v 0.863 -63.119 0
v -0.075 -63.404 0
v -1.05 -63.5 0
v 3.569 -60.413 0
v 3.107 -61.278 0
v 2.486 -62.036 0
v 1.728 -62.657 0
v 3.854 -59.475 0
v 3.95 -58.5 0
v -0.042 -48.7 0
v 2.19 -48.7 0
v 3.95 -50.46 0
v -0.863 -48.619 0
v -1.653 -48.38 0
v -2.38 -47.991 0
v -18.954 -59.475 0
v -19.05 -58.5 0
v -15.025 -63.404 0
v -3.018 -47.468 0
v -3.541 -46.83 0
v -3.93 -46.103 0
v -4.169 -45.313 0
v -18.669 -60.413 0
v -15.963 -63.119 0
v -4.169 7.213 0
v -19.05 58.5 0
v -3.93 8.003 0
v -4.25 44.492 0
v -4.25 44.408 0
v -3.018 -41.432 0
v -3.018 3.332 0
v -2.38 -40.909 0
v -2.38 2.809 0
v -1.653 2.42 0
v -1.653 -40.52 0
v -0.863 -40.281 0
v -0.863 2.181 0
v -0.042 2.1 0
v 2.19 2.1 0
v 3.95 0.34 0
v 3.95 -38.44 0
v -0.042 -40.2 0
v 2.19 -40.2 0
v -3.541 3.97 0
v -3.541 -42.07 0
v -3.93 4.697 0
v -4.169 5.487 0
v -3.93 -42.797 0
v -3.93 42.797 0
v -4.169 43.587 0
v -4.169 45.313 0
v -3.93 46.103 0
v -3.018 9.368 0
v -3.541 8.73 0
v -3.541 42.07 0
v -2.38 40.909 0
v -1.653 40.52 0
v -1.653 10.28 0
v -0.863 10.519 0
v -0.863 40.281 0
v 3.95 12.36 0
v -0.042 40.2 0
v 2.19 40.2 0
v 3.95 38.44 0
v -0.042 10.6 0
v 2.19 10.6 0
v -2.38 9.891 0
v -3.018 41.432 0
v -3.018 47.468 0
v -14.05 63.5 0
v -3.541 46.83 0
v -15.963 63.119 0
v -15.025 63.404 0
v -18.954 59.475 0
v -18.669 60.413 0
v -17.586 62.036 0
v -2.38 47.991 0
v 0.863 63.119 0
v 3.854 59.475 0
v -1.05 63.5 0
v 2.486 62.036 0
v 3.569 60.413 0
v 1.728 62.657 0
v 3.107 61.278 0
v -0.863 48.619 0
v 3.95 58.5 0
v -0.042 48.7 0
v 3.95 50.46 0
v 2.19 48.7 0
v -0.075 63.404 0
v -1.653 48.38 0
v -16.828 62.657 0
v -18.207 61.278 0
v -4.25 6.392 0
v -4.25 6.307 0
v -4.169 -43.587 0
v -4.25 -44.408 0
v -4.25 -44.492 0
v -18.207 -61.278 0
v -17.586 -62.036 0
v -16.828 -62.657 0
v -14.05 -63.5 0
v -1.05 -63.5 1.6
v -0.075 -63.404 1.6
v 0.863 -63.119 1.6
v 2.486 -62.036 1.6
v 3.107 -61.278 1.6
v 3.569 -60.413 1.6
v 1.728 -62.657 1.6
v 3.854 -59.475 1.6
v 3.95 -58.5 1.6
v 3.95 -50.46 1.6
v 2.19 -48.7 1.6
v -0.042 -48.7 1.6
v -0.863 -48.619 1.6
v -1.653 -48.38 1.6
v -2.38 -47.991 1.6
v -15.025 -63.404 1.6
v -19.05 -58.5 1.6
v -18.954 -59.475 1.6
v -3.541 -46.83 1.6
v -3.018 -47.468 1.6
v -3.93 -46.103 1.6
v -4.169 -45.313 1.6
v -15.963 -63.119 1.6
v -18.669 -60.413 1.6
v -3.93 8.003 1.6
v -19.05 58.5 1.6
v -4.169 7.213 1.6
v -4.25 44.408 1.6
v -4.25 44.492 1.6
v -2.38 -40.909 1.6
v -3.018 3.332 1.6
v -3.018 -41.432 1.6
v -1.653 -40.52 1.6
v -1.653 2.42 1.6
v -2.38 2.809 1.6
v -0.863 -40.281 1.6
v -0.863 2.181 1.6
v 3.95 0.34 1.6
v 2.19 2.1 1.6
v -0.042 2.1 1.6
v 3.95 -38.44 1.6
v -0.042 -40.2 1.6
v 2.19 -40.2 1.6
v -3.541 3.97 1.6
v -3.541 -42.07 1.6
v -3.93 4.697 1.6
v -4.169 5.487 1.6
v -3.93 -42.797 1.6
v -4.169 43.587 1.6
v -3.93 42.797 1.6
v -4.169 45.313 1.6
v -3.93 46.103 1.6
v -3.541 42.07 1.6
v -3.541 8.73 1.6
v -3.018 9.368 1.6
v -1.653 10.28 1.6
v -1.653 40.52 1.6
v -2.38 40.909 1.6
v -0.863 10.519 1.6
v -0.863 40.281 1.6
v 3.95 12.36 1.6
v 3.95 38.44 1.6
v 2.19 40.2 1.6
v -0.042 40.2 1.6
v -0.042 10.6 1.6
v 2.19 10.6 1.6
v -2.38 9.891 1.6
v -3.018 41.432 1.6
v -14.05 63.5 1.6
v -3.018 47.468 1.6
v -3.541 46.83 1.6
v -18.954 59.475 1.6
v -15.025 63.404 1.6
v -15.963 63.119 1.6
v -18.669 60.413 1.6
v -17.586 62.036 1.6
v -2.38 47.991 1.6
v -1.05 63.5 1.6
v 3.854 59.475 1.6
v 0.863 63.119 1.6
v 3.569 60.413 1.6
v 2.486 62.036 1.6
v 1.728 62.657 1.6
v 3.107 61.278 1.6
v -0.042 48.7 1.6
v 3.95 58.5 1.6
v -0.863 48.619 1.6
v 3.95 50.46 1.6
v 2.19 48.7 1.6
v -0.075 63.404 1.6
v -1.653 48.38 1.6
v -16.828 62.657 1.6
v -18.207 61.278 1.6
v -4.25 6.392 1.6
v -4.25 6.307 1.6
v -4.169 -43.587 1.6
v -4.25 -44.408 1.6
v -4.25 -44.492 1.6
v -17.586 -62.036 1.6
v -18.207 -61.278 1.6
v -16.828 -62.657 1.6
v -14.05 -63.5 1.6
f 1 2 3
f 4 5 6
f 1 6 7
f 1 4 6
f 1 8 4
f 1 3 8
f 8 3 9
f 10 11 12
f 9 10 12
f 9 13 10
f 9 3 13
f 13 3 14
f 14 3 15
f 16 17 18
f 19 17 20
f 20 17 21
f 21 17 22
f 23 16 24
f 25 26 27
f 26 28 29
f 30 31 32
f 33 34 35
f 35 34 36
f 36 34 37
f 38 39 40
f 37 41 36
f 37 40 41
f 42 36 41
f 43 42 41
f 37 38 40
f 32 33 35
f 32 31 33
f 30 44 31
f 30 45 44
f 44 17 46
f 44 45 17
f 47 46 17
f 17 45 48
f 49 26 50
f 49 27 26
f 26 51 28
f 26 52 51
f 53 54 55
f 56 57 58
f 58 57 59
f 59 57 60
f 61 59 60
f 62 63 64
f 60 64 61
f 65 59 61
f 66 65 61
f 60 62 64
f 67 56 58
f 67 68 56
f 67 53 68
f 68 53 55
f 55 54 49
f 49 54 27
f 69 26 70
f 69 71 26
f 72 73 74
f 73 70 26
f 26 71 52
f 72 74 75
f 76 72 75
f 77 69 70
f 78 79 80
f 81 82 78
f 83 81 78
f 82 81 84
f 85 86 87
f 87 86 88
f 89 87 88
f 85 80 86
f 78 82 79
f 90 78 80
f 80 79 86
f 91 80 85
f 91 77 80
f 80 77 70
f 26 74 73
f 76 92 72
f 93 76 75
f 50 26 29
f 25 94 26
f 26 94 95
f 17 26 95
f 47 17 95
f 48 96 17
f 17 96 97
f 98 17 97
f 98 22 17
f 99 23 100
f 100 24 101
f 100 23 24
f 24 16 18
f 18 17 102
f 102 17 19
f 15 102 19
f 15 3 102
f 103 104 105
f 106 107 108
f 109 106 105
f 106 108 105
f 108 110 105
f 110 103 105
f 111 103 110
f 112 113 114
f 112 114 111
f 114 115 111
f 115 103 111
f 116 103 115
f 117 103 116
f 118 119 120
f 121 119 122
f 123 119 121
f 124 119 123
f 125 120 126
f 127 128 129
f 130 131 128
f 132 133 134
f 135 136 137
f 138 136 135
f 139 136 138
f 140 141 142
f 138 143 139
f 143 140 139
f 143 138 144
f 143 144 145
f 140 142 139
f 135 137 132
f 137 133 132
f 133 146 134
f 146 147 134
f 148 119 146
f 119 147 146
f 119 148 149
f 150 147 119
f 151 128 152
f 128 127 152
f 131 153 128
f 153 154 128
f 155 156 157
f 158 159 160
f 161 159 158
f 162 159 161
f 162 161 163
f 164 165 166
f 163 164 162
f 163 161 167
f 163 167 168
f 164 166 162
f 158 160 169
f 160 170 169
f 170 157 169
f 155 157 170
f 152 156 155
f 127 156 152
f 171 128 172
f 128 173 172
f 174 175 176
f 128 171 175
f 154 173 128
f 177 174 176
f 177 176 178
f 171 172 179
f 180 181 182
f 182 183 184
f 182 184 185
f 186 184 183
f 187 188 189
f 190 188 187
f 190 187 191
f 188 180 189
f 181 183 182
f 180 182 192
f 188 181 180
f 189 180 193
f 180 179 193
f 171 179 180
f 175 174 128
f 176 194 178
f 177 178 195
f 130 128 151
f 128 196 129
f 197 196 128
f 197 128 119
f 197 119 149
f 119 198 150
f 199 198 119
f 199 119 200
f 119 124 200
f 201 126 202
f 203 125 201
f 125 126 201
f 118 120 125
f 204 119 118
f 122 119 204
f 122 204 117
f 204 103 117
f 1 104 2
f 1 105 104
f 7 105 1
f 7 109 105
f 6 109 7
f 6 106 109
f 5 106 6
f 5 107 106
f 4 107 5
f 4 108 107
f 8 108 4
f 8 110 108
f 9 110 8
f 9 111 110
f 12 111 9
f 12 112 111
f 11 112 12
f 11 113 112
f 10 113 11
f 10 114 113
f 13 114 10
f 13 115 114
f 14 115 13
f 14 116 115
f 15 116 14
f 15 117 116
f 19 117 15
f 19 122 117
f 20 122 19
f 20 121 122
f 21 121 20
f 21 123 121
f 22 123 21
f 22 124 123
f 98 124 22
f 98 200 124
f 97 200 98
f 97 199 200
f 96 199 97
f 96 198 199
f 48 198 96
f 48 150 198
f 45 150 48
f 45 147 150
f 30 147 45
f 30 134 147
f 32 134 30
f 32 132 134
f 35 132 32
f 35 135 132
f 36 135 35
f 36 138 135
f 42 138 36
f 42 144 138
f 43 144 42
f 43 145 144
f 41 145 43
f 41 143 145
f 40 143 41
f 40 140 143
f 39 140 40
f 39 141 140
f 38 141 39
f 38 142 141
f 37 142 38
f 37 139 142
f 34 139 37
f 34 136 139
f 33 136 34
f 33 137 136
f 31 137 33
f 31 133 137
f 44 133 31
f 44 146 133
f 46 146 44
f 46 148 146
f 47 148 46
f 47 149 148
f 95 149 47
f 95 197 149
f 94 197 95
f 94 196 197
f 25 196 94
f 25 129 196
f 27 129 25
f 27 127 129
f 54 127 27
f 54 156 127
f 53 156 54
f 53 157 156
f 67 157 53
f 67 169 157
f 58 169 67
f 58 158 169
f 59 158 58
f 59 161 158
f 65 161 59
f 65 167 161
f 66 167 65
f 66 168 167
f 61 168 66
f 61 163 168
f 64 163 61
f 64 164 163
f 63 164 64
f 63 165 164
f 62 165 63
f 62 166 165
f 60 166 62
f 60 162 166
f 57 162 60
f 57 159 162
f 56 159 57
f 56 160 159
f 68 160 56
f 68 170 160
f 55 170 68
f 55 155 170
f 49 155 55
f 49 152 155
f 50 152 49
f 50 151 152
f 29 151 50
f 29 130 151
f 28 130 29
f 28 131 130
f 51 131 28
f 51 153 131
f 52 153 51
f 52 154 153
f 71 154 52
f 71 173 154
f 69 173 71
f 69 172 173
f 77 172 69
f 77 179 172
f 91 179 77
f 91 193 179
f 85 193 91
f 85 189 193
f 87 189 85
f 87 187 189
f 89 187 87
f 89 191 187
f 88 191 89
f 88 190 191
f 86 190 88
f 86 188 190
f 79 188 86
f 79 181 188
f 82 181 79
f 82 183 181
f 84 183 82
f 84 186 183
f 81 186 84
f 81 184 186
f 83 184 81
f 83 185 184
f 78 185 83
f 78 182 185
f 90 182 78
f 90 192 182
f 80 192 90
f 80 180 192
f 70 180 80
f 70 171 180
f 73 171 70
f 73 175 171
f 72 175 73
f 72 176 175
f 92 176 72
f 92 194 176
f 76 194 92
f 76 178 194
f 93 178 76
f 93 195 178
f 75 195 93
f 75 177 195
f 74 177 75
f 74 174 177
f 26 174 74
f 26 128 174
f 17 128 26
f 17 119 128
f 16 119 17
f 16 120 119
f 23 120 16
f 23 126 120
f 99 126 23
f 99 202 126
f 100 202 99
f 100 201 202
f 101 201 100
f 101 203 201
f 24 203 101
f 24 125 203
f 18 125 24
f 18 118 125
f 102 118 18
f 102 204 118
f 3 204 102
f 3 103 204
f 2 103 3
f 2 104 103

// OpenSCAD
// file: ../lib/TOGArrayLib1.scad
// TOGArrayLib1.4
// 
// Functions for working with arrays.
// 
// v1.1:
// - tal1_reduce assert(is_list(items)) to prevent infinite recursion
//   when given undefined or other non-list values
// v1.1.1:
// - Fix tal1_uniq_remap_v2 to return "list-remap-result" as the
//   first element of the returned list
// v1.2:
// - Add tal1_replace_at function
// v1.3:
// - tal1_is_vec_of, tal1_is_vec_of_num
// v1.4:
// - tal1_assert_for_each, for when you want to assert something
//   about each of a list of items and get nice failure messages

/**
 * Make a list with the contents of list `a`,
 * but starting at offset `off`, replaced by the contents of list `b`.
 * len(result) = max(len(a), off+len(b))
 */
function tal1_replace_at(a, off, b, default_value=undef, default_value_function=undef) =
	assert(is_list(a))
	assert(is_list(b))
	let( _dvf = !is_undef(default_value_function) ? default_value_function : function(i) default_value )
[
	for( i=[0:1:min(off,len(a))-1] ) a[i],
	for( i=[len(a):1:off-1] ) _dvf(i),
	for( i=[off:1:off+len(b)-1] ) b[i-off],
	for( i=[off+len(b):1:len(a)-1] ) a[i],
];

// Simplest case
assert([] == tal1_replace_at([], 0, []));
// Second simplest cases
assert(["foo"] == tal1_replace_at(["foo"], 0, []));
assert(["foo"] == tal1_replace_at([], 0, ["foo"]));
// Replace one item
assert(["foo","quux","baz"] == tal1_replace_at(["foo","bar","baz"], 1, ["quux"]));
// Replace and extend
assert(["foo","quux","tuna","tina"] == tal1_replace_at(["foo","bar","baz"], 1, ["quux", "tuna", "tina"]));
// Add beyond end of `a`
assert(["foo","zzz","quux"] == tal1_replace_at(["foo"], 2, ["quux"], default_value="zzz"));
// Adding 'nothing' should still fill to that point with defaults
assert(["foo","zzz","zzz"] == tal1_replace_at(["foo"], 3, [], default_value="zzz"));


function tal1_reduce(start, items, func, offset=0) =
	assert(is_list(items))
	len(items) == offset ? start :
	tal1_reduce(func(start, items[offset]), items, func, offset+1);

function tal1_consecutive_duplicate_count(items) = tal1_reduce(
	[0, undef],
	items,
	function(z,item) [z[0] + (item == z[1] ? 1 : 0), item]
)[0];

assert(0 == tal1_consecutive_duplicate_count([]));
assert(0 == tal1_consecutive_duplicate_count([50]));
assert(1 == tal1_consecutive_duplicate_count([50,50]));
assert(0 == tal1_consecutive_duplicate_count([50,51,52,53]));
assert(1 == tal1_consecutive_duplicate_count([50,51,52,52]));
assert(3 == tal1_consecutive_duplicate_count([50,50,50,50]));

// Set test_size to arbirarily large values
// to ensure that OpenSCAD can handle heavy recursion
let(test_size=1000) assert(test_size/2 == tal1_consecutive_duplicate_count([for(i=[0:1:test_size-1]) floor(i/2)]));



function tal1_uniq_(items, off0, off1) =
	let(chunklen = off1-off0)
	chunklen == 0 ? [] :
	chunklen == 1 ? [items[off0]] :
	let(half=floor(chunklen/2))
	let(left  = tal1_uniq_(items, off0     , off0+half))
	let(right = tal1_uniq_(items, off0+half, off1     ))
	assert(len(left) > 0)
	assert(len(right) > 0)
	left[len(left)-1] == right[0] ? [each left, for(i=[1:1:len(right)-1]) right[i]] :
	[each left, each right];

/** Given a list of items, returns a new list with identical consecutive items merged */
function tal1_uniq(items) = tal1_uniq_(items, 0, len(items));

assert([] == tal1_uniq([]));
assert([123] == tal1_uniq([123]));
assert([55,0,1,2,3] == tal1_uniq([55,0,1,2,3]));
assert([55,0,1,2] == tal1_uniq([55,0,1,1,2]));
assert([55,0,1] == tal1_uniq([55,55,0,0,0,0,0,0,1,1,1,1]));
assert([55,0] == tal1_uniq([55,0,0,0,0,0,0,0]));



/**
 * Returns [new items, old index -> new index mapping].
 * No-op version.
 */
function tal1_uniq_remap_v1(items) =
	["list-remap-result", items, [for (vi=[0:1:len(items)-1]) vi]];

// [a, a, b, b, c, c]
//
// [a,    ...], []  -> [a],[0]
// [a, a, ...], [0] -> [a],[0,0]

assert([1,2,3] == [1,2,3]);

/**
 * Recursive version that will combine adjacent identical vertexes,
 * but will use the original items.
 */
function tal1_uniq_remap_v2(items, map=[]) =
	let(index = len(map))
	len(items) == index ? ["list-remap-result", items, map] :
	index == 0 ? tal1_uniq_remap_v2(items, [0]) :
	items[index] == items[map[index-1]] ? tal1_uniq_remap_v2(items, [for(vi=map) vi, map[index-1]]) :
	tal1_uniq_remap_v2(items, [for(vi=map) vi, index]);

assert(tal1_uniq_remap_v2([1,1,2,2,3,4]) == ["list-remap-result", [1,1,2,2,3,4], [0,0,2,2,4,5]]);


/**
 * Returns true if `vec` is a list of at least min_len items
 * and component_check(each item, even those beyond min_len) is true.
 */
function tal1_is_vec_of(vec, min_len=0, component_check=function(x) true) =
	assert(is_num(min_len) && min_len >= 0)
	assert(is_function(component_check))
	is_list(vec) && len(vec) >= min_len &&
	tal1_reduce(true, vec, function(prev,item) prev && component_check(item));

function tal1_is_vec_of_num(vec, min_len=0) = tal1_is_vec_of(vec, min_len, function(i) is_num(i));

assert( true == tal1_is_vec_of_num([1,2,3]));
assert( true == tal1_is_vec_of_num([]));
assert( true == tal1_is_vec_of_num([1,2,3], 3));
assert(false == tal1_is_vec_of_num([1,2], 3));
assert(false == tal1_is_vec_of_num([1,2,"spoon"], 3));
// Requirements are ambiguous when
// first min_len items are numbers, but there are non-numeric items afterwards,
// so let's error on the side of saying 'no, it's not a list of numbers';
// i.e. the item check and the min_len are independent.
assert(false == tal1_is_vec_of_num([1,2,3,"artichoke"], 3));


/**
 * Asserts that item_checker(each item in list, index of item)[0] is true.
 * Second element of item_checker return value is assertion message.
 * Returns the original list, in case that's useful to you.
 */
function tal1_assert_for_each(list, item_checker) =
	let( _ignored = [ for(i=[0:1:len(list)-1])
		let(q=item_checker(list[i],i))
		let(passed=is_bool(q) ? q : is_list(q) ? q[0] : assert(false, str(
			"tal1_assert_for_each: item_checker should return Bool|[Bool,String], but returned ",
			q, " for item at index ", i)))
		let(message=is_list(q) ? q[1] : undef)
		assert(passed, message)
		q
	])
	list;

// Callback can return a boolean...
assert([1,2,3] == tal1_assert_for_each([1,2,3], function(v,i) is_num(v)));
// ...or a [boolean, string]
assert([1,2,3] == tal1_assert_for_each([1,2,3], function(v,i) [is_num(v), "element be a num"]));
// file: ../lib/TOGMod1Constructors.scad
// TOGMod1Constructors-v1.7
// 
// Functions to construct objects understood by TOGMod1
// 
// v1.1:
// - Add togmod1_make_rounded_rect
// v1.2:
// - togmod1_make_rounded_rect can make ovals
// v1.3:
// - togmod1_circle_points, to just get the points of a circle
// - if pos parameter to circle function has a third element,
//   returned vertexes will include it as the z component;
// v1.3.1
// - Some assertions
// v1.4:
// - Refactor togmod1_rounded_rect_points and togmod1_circle_points
//   to use togmod1__make_nd_vector_adder for adapting to whatever
//   `pos` parameter is.
// v1.5:
// - togmod_rounded_rect_points will not simplify completely rounded sides
//   (where length of side is exactly twice the rounding radius)
//   unless simplify_rounded_sides=true
//   - This makes it more useful for polyhedron generation,
//     where radius varies, but number of points must remain constant.
// v1.6:
// - togmod1_make_rect makes a simple rectangle
// - togmod1_make_rounded_rect will defer to togmod1_make_rect when r=0
// v1.7:
// - togmod1_make_circle will return empty shape (["union"]) when d=0

use <./TOGArrayLib1.scad>

function togmod1__make_nd_vector_adder(origin=[0,0]) =
	let(origin_is_zero = tal1_reduce(true, origin, function(prev,item) prev && item == 0))
	origin_is_zero ? (function(vec) len(vec) >= len(origin) ? vec : tal1_replace_at(origin, 0, vec)) :
	function(vec) [
		for(i=[0:1:max(len(origin),len(vec))-1]) (len(vec) > i ? vec[i] : 0) + (len(origin) > i ? origin[i] : 0),
	];

assert([1,2,3] == togmod1__make_nd_vector_adder()([1,2,3]));
echo(togmod1__make_nd_vector_adder([0,0,3])([1,2]));
assert([1,2,3] == togmod1__make_nd_vector_adder([0,0,3])([1,2]));


function togmod1_make_cuboid(size) =
	assert(is_list(size))
	assert(len(size) >= 3)
	assert(is_num(size[0]))
	assert(is_num(size[1]))
	assert(is_num(size[2]))
	["polyhedron-vf", [
		[-size[0]/2, -size[1]/2, -size[2]/2],
		[+size[0]/2, -size[1]/2, -size[2]/2],
		[-size[0]/2, +size[1]/2, -size[2]/2],
		[+size[0]/2, +size[1]/2, -size[2]/2],
		[-size[0]/2, -size[1]/2, +size[2]/2],
		[+size[0]/2, -size[1]/2, +size[2]/2],
		[-size[0]/2, +size[1]/2, +size[2]/2],
		[+size[0]/2, +size[1]/2, +size[2]/2]
	], [
		[0,1,3,2],[0,4,5,1],[4,6,7,5],[3,7,6,2],[1,5,7,3],[6,4,0,2]
	]];

function togmod1_make_polygon(verts) =
	["polygon-vp", verts, [[for( i=[0:1:len(verts)-1] ) i%len(verts)]]];

function togmod1_rounded_rect_points(size, r, pos=[0,0], simplify_rounded_sides=false) =
	assert(is_list(size))
	assert(len(size) >= 2)
	let(radii = is_list(r) ? r : is_num(r) ? [r,r] : assert(false, "rounded_rect r(adius) should be list<num> or num"))
	let(rx = radii[0])
	let(ry = radii[1])
	assert(is_num(rx))
	assert(is_num(ry))
	assert(size[0] >= 2*rx, str("size[0] must be >= 2*r[0]; size[0] = ",size[0],", 2*r[0] = ",2*rx))
	assert(size[1] >= 2*ry, str("size[1] must be >= 2*r[1]; size[1] = ",size[1],", 2*r[1] = ",2*ry))
	let(quarterfn=max($fn/4, 1))
	let(qfnx = simplify_rounded_sides && size[0] == 2*rx ? quarterfn-1 : quarterfn)
	let(qfny = simplify_rounded_sides && size[1] == 2*ry ? quarterfn-1 : quarterfn)
	let(finalizepos = togmod1__make_nd_vector_adder(pos))
[
	for(a=[0 : 1 : qfnx]) let(ang=      a*90/quarterfn) finalizepos([ size[0]/2-rx + rx*cos(ang),  size[1]/2-ry + ry*sin(ang)]),
	for(a=[0 : 1 : qfny]) let(ang= 90 + a*90/quarterfn) finalizepos([-size[0]/2+rx + rx*cos(ang),  size[1]/2-ry + ry*sin(ang)]),
	for(a=[0 : 1 : qfnx]) let(ang=180 + a*90/quarterfn) finalizepos([-size[0]/2+rx + rx*cos(ang), -size[1]/2+ry + ry*sin(ang)]),
	for(a=[0 : 1 : qfny]) let(ang=270 + a*90/quarterfn) finalizepos([ size[0]/2-rx + rx*cos(ang), -size[1]/2+ry + ry*sin(ang)]),
];

function togmod1_make_rect(size) =
	togmod1_make_polygon([
		[-size[0]/2, -size[1]/2],
		[+size[0]/2, -size[1]/2],
		[+size[0]/2, +size[1]/2],
		[-size[0]/2, +size[1]/2],
	]);

function togmod1_make_rounded_rect(size, r) =
	r == 0 ? togmod1_make_rect(size) :
	togmod1_make_polygon(togmod1_rounded_rect_points(size,r,simplify_rounded_sides=true));

function togmod1_circle_points(r, pos=[0,0], d=undef) =
	assert( !is_undef(r) || !is_undef(d) )
	assert(!is_undef(pos[0]))
	assert(!is_undef(pos[1]))
	let(finalizepos = togmod1__make_nd_vector_adder(pos))
	let(r_ = !is_undef(r) ? r : d/2)
	let(fn = max($fn, 6))
	[for(i=[0 : 1 : fn-1]) finalizepos([r_*cos(i*360/fn), r_*sin(i*360/fn)])];

function togmod1_make_circle(r, pos=[0,0], d=undef) =
	r == 0 || d == 0 ? ["union"] :
	togmod1_make_polygon(togmod1_circle_points(r=r, pos=pos, d=d));

function togmod1_make_cylinder(d, zrange=[0,1], r=undef, pos=[0,0]) =
	assert( !is_undef(r) || !is_undef(d) )
	let( r_ = !is_undef(r) ? r : d/2 )
	// TODO: Make polyhedron directly
	["linear-extrude-zs", zrange, togmod1_make_circle(r=r_, pos=pos)];

function togmod1__is_range1d(range) = is_list(range) && len(range) == 2 && is_num(range[0]) && is_num(range[1]);

function togmod1_linear_extrude_z(range, shape) =
	assert(togmod1__is_range1d(range))
	["linear-extrude-zs", range, shape];
function togmod1_linear_extrude_x(range, shape) =
	assert(togmod1__is_range1d(range))
	["rotate", [90, 0, 90], togmod1_linear_extrude_z(range, shape)];
function togmod1_linear_extrude_y(range, shape) =
	assert(togmod1__is_range1d(range))
	["rotate", [90, 0, 180], togmod1_linear_extrude_z(range, shape)];
// file: ../lib/TOGMod1.scad
// TOGMod1
// OpenSCAD library for representing shapes
// 
// See also: Functional OpenSCAD (https://github.com/thehans/FunctionalOpenSCAD)

module togmod1_domodule(mod) {
	assert(is_list(mod));
	assert(len(mod) > 0);
	if( mod[0] == "polygon-vp" ) {
		// ["polygon-vp", vertexes, paths]
		polygon(points=mod[1], paths=mod[2]);
	} else if( mod[0] == "polyhedron-vf" ) {
		polyhedron(mod[1], faces=mod[2]);
	} else if( mod[0] == "scale" ) {
		assert(len(mod) == 3);
		scale(mod[1]) togmod1_domodule(mod[2]);
	} else if( mod[0] == "translate" ) {
		assert(len(mod) == 3);
		assert(is_list(mod[1]));
		for(c=mod[1]) assert(is_num(c), "translate component should be numeric");
		translate(mod[1]) togmod1_domodule(mod[2]);
	} else if( mod[0] == "rotate" ) {
		assert(len(mod) == 3);
		rotate(mod[1]) togmod1_domodule(mod[2]);
	} else if( mod[0] == "intersection" ) {
		intersection_for( i=[1:1:len(mod)-1] ) togmod1_domodule(mod[i]);
	} else if( mod[0] == "difference" ) {
		difference() {
			togmod1_domodule(mod[1]);
			for( i=[2:1:len(mod)-1] ) togmod1_domodule(mod[i]);
		}
	} else if( mod[0] == "union" ) {
		for( i=[1:1:len(mod)-1] ) togmod1_domodule(mod[i]);
	} else if( mod[0] == "hull" ) {
		hull() for( i=[1:1:len(mod)-1] ) togmod1_domodule(mod[i]);
	} else if( mod[0] == "offset-rs" ) {
		assert(len(mod) == 3);
		assert(is_num(mod[1]));
		assert(is_list(mod[2]));
		offset(mod[1]) togmod1_domodule(mod[2]);
	} else if( mod[0] == "linear-extrude-zs" ) {
		// ["linear-extrude-zs", [z0,z1], 2d_shape] // centered
		// ["linear-extrude-zs", height, 2d_shape]
		let( zrange = is_list(mod[1]) ? mod[1] : [-mod[1]/2, mod[1]/2] ) {
			translate([0,0,zrange[0]]) linear_extrude(zrange[1]-zrange[0]) togmod1_domodule(mod[2]);
		}
	} else if( mod[0] == "render" ) {
		render() togmod1_domodule(mod[1]);
	} else if( mod[0] == "minkowski" ) {
		minkowski() {
			togmod1_domodule(mod[1]);
			togmod1_domodule(mod[2]);
		}
	} else if( mod[0] == "x-debug" ) {
		# togmod1_domodule(mod[1]);
	} else if( mod[0] == "x-color" ) {
		color(mod[1]) togmod1_domodule(mod[2]);
	} else {
		assert(false, str("Unrecognized shape: ", mod[0]));
	}
}
// main file
// PepsiPanelNetSpacer1.0
// 
// Spacer to take up about the same width as the netting on the Pepsi panels,
// at the very edge of the panel where the netting does not cover.

thickness = 1.6;
width = 23.0; // A little under an inch
slot_width = 8.5; // A little over 5/16"
$fn = 32;

module __pepsipanelnetspacer1__end_params() { }

inch = 25.4;
length = 5*inch;

use <../lib/TOGMod1.scad>
use <../lib/TOGMod1Constructors.scad>

togmod1_domodule(
	let( hull_cx = (width-1.5*inch)/2 )
	let( slot_cx = 3/4*inch )
	let( edge_x  = 3/4*inch - (1.5*inch-width) )
	let( slot_length = 1.5*inch )
	let( slot = togmod1_make_rounded_rect([slot_length + slot_width, slot_width], r=slot_width/2*0.99) )
	let( boat = ["rotate", [0,0,45], togmod1_make_rect([slot_width,slot_width])] )
	togmod1_linear_extrude_z(
		[0, thickness],
		["difference",
			["translate", [hull_cx, 0, 0], togmod1_make_rounded_rect([width, 5*inch], r=5)],
			
			for( y=[-length/2+3/4*inch, -length/2+(2+3/4)*inch, length/2-3/4*inch] ) ["union",
				["translate", [slot_cx, y], slot],
			   ["translate", [edge_x, y], boat],
			]
			// togmod1_make_circle(d=slot_width),
		]
	)
);
